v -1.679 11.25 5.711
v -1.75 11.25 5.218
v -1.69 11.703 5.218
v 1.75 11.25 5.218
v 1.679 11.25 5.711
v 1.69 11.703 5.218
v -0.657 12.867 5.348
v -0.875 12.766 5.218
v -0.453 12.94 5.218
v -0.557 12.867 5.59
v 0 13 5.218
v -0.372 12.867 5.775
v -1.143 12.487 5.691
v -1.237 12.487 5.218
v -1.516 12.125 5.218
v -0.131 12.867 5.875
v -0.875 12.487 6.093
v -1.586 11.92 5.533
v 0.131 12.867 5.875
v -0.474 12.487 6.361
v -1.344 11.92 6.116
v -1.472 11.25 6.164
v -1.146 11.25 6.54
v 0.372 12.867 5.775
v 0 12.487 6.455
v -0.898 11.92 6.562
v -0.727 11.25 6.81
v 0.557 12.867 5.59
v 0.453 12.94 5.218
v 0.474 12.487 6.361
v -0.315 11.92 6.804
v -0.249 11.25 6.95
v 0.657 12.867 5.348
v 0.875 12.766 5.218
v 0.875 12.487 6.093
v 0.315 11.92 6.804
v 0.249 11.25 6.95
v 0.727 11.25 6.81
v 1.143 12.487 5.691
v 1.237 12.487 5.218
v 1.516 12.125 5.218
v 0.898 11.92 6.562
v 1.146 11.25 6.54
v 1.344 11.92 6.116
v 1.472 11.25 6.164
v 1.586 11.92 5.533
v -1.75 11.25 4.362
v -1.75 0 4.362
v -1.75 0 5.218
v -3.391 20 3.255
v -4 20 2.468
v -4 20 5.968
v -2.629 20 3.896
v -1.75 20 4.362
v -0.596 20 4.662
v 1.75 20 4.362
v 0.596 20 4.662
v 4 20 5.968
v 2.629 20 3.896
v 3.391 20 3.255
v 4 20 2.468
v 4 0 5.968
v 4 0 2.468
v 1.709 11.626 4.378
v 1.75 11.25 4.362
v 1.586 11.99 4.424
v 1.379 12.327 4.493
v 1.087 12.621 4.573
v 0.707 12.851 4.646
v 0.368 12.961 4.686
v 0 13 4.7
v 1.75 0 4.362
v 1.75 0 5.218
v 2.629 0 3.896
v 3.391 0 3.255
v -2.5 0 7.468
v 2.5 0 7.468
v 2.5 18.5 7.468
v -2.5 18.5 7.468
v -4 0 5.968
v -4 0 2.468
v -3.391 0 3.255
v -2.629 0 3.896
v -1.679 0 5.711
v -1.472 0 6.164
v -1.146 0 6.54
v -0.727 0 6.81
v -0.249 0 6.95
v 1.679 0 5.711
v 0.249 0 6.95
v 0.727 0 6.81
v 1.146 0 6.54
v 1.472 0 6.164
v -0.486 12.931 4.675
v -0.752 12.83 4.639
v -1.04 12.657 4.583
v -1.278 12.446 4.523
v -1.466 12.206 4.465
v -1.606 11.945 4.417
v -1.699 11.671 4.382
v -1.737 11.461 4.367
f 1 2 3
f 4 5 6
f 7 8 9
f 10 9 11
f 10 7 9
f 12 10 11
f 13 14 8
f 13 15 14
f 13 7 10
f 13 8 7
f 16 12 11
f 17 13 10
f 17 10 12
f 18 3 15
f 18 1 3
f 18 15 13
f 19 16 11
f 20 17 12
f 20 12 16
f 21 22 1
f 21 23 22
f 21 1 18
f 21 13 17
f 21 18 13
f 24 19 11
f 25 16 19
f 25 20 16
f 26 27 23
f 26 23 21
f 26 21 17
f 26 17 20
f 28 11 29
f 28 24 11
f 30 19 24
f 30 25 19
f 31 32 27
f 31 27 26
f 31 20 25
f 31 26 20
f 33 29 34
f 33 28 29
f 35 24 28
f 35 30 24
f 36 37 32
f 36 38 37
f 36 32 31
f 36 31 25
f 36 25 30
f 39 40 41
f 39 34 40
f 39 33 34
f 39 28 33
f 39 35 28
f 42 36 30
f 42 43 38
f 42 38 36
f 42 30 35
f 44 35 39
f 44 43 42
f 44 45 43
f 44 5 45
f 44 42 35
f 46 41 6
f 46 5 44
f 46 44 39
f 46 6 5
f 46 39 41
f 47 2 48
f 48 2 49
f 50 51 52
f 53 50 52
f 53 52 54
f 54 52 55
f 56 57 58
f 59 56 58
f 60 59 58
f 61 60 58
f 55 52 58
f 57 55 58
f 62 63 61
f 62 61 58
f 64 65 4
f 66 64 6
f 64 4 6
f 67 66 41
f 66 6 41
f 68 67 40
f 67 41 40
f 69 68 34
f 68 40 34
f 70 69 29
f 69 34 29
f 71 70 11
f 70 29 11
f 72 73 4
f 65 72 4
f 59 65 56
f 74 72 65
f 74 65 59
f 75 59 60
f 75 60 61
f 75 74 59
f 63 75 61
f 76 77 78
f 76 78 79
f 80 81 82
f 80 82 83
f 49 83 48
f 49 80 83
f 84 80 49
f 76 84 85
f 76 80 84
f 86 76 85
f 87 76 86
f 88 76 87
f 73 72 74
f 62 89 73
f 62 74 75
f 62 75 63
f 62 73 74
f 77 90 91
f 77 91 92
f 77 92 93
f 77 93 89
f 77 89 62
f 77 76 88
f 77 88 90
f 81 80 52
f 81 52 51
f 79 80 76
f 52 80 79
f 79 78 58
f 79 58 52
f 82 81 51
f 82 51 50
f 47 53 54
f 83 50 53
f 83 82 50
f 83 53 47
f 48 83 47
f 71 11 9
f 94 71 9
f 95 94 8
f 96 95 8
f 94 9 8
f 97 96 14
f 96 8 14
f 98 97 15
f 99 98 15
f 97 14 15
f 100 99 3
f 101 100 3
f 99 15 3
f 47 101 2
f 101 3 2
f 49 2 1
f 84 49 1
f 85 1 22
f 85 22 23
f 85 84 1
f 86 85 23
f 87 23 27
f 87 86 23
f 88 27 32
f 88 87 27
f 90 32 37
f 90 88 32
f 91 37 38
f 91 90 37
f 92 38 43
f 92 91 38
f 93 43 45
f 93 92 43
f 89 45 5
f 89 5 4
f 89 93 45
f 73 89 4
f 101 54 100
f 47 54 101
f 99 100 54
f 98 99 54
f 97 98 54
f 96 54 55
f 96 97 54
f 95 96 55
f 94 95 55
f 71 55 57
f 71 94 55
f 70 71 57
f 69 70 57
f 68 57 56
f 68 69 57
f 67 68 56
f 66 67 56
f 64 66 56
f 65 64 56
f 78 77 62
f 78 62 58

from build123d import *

# Parameters (mm, degrees)
F5_DEPTH  = 20
F6_SIZE   = 1.5
F7_SIZE   = 1.5
F11_DEPTH = 2.7510001


# Not quite as in the source:
# - a feature names something its author has since deleted; it is built from what else it names


with BuildPart() as f5:
    # F4 (on Front) → F5 (new body)
    with BuildSketch(Plane.XZ):
        with BuildLine():
            ThreePointArc((1.75, 4.3620522693), (3.0269919036, 3.5954582483), (4, 2.4677925359))
            Line((4, 2.4677925359), (4, 7.4677925359))
            Line((4, 7.4677925359), (-4, 7.4677925359))
            Line((-4, 7.4677925359), (-4, 2.4677925359))
            ThreePointArc((-4, 2.4677925359), (-3.0269919036, 3.5954582483), (-1.75, 4.3620522693))
            Line((-1.75, 4.3620522693), (-1.75, 5.2177925359))
            ThreePointArc((-1.75, 5.2177925359), (0, 6.9677925359), (1.75, 5.2177925359))
            Line((1.75, 5.2177925359), (1.75, 4.3620522693))
        make_face()
        with BuildLine():
            ThreePointArc((-1.75, 4.3620522693), (0, 4.7), (1.75, 4.3620522693))
            Line((1.75, 4.3620522693), (1.75, 5.2177925359))
            ThreePointArc((1.75, 5.2177925359), (0, 6.9677925359), (-1.75, 5.2177925359))
            Line((-1.75, 5.2177925359), (-1.75, 4.3620522693))
        make_face()
    extrude(amount=-F5_DEPTH)

    # F6
    f6_edges = [f5.edges().sort_by_distance(p)[0] for p in [
        (-4, 10, 7.467793),
        (4, 10, 7.467793),
    ]]
    chamfer(f6_edges, length=F6_SIZE)

    # F7
    f7_edges = [f5.edges().sort_by_distance(p)[0] for p in [
        (0, 20, 7.467793),
    ]]
    chamfer(f7_edges, length=F7_SIZE)

    # F9 (on offset) → F10 (revolve, cut)
    with BuildSketch(Plane.XY.offset(5.2177925359)):
        with BuildLine():
            Line((-1.75, 11.25), (-1.75, 0))
            Line((-1.75, 0), (0, 0))
            Line((0, 0), (0, 13))
            ThreePointArc((0, 13), (-1.2374368671, 12.4874368671), (-1.75, 11.25))
        make_face()
    revolve(axis=Axis((0, 6.5, 5.2177925359), (0, 1, 0)), mode=Mode.SUBTRACT)

    # F9 (on offset) → F11 (cut, through all)
    with BuildSketch(Plane.XY.offset(5.2177925359)):
        with BuildLine():
            Line((0, 13), (0, 0))
            Line((0, 0), (1.75, 0))
            Line((1.75, 0), (1.75, 11.25))
            ThreePointArc((1.75, 11.25), (1.2374368671, 12.4874368671), (0, 13))
        make_face()
        with BuildLine():
            Line((-1.75, 11.25), (-1.75, 0))
            Line((-1.75, 0), (0, 0))
            Line((0, 0), (0, 13))
            ThreePointArc((0, 13), (-1.2374368671, 12.4874368671), (-1.75, 11.25))
        make_face()
    extrude(amount=-F11_DEPTH, mode=Mode.SUBTRACT)


solid = f5.part
